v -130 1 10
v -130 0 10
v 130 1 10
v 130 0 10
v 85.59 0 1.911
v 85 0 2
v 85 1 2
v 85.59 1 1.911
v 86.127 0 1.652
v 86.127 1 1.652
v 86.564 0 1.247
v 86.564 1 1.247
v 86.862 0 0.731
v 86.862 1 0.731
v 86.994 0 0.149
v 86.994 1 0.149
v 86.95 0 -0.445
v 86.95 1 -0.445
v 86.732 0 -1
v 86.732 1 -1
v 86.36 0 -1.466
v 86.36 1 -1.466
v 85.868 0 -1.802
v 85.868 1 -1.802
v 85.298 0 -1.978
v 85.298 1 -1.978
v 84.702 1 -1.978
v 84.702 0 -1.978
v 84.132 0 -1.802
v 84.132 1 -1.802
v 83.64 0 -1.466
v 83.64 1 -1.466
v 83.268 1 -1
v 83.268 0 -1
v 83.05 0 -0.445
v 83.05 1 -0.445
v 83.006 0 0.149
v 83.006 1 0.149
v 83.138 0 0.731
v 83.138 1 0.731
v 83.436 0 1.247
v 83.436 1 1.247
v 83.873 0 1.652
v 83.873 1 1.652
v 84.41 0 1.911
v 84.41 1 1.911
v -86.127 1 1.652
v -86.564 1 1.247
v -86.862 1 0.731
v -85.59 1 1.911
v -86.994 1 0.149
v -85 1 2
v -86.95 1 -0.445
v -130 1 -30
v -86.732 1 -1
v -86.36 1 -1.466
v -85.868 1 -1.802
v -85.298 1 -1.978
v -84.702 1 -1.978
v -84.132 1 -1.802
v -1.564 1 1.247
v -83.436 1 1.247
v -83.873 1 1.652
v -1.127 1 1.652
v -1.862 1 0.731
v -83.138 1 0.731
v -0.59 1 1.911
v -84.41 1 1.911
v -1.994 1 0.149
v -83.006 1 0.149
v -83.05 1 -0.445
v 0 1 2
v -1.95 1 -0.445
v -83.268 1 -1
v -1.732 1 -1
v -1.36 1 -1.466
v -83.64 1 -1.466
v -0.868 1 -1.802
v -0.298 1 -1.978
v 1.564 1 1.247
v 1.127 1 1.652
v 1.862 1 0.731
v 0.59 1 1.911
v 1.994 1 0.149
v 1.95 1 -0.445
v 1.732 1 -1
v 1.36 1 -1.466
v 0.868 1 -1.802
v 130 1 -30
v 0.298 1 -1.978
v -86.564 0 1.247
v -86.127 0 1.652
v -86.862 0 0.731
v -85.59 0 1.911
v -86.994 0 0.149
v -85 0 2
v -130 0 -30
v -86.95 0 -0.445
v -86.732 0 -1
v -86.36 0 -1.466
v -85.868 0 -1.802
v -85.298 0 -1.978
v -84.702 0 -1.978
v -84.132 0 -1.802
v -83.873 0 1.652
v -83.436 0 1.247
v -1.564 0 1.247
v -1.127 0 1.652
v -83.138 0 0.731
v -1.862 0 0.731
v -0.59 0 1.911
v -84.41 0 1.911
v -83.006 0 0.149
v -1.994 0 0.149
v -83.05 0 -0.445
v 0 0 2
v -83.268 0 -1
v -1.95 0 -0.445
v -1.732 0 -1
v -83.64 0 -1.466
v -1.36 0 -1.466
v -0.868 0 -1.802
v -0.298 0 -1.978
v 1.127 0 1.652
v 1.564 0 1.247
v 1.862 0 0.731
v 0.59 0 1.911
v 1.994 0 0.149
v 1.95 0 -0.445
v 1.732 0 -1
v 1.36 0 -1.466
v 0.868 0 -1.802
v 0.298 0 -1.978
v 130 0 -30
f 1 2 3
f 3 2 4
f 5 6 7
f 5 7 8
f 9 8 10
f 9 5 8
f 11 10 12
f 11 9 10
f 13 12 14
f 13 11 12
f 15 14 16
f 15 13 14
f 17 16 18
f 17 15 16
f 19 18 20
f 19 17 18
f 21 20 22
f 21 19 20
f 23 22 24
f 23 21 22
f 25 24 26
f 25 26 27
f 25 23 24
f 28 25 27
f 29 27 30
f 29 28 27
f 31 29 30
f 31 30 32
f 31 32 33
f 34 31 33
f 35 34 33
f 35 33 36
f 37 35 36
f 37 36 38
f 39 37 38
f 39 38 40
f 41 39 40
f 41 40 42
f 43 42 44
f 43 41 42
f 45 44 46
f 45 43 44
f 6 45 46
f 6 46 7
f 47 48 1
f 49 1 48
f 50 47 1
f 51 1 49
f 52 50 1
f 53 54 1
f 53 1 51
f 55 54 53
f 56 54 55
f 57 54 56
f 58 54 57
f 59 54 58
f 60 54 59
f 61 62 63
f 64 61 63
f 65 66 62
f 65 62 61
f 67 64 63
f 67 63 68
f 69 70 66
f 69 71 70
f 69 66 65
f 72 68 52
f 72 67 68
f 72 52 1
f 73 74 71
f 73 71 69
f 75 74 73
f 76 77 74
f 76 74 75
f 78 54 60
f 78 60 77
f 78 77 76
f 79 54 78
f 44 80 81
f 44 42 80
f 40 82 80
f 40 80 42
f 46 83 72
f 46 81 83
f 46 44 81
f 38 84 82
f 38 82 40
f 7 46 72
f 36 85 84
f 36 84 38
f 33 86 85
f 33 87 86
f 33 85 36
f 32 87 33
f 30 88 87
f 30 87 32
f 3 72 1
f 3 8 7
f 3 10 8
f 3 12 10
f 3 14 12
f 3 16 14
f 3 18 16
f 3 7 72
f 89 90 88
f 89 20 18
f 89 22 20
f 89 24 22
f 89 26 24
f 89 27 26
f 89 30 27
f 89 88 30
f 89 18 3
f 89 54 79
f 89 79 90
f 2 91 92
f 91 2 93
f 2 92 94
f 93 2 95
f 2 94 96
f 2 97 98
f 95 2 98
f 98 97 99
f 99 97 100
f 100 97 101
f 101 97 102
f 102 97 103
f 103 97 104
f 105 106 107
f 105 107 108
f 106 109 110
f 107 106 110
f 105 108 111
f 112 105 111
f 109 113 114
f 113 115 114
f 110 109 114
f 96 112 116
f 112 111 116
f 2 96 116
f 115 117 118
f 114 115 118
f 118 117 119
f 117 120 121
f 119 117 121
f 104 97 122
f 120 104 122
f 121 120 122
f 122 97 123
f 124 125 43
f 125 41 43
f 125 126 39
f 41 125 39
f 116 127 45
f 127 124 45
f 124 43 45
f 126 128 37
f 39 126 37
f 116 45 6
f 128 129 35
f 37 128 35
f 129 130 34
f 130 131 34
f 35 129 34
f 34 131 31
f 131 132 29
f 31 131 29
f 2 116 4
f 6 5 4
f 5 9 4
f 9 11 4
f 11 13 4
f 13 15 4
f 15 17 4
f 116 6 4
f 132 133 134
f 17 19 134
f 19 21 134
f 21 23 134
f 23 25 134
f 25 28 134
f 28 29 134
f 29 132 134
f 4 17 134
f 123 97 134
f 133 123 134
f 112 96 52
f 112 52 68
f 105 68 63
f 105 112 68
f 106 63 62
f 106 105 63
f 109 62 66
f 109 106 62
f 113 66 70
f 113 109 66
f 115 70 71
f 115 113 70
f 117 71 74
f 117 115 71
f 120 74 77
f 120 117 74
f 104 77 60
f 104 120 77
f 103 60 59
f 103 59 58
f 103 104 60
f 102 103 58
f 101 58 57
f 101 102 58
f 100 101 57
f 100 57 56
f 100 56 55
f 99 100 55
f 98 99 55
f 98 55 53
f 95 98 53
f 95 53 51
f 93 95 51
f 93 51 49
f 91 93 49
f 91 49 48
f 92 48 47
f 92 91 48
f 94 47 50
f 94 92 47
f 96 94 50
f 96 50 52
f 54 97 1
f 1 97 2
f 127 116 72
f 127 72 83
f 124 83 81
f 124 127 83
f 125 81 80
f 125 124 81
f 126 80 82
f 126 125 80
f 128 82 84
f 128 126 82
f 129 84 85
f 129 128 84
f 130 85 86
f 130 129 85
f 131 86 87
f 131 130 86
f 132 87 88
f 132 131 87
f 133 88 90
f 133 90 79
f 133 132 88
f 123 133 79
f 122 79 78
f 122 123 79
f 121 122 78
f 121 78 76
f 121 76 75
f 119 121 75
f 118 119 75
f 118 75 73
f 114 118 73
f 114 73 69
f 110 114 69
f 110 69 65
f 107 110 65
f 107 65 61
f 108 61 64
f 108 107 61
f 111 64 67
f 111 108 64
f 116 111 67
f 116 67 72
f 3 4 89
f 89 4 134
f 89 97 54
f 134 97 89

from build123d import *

# Parameters (mm, degrees)
SKETCH1_4_W         = 260
SKETCH1_4_H         = 40
SKETCH1_4_R         = 2
BOSS_EXTRUDE3_DEPTH = 1


with BuildPart() as part:
    # Sketch1_4 → Boss-Extrude3 (new body)
    with BuildSketch(Plane(origin=(0, 0, 0), x_dir=(1, 0, 0), z_dir=(0, 1, 0))):
        with Locations((0, 10)):
            Rectangle(SKETCH1_4_W, SKETCH1_4_H)
        with Locations((-85, 0)):
            Circle(SKETCH1_4_R, mode=Mode.SUBTRACT)
        Circle(SKETCH1_4_R, mode=Mode.SUBTRACT)
        with Locations((85, 0)):
            Circle(SKETCH1_4_R, mode=Mode.SUBTRACT)
    extrude(amount=BOSS_EXTRUDE3_DEPTH)


solid = part.part
